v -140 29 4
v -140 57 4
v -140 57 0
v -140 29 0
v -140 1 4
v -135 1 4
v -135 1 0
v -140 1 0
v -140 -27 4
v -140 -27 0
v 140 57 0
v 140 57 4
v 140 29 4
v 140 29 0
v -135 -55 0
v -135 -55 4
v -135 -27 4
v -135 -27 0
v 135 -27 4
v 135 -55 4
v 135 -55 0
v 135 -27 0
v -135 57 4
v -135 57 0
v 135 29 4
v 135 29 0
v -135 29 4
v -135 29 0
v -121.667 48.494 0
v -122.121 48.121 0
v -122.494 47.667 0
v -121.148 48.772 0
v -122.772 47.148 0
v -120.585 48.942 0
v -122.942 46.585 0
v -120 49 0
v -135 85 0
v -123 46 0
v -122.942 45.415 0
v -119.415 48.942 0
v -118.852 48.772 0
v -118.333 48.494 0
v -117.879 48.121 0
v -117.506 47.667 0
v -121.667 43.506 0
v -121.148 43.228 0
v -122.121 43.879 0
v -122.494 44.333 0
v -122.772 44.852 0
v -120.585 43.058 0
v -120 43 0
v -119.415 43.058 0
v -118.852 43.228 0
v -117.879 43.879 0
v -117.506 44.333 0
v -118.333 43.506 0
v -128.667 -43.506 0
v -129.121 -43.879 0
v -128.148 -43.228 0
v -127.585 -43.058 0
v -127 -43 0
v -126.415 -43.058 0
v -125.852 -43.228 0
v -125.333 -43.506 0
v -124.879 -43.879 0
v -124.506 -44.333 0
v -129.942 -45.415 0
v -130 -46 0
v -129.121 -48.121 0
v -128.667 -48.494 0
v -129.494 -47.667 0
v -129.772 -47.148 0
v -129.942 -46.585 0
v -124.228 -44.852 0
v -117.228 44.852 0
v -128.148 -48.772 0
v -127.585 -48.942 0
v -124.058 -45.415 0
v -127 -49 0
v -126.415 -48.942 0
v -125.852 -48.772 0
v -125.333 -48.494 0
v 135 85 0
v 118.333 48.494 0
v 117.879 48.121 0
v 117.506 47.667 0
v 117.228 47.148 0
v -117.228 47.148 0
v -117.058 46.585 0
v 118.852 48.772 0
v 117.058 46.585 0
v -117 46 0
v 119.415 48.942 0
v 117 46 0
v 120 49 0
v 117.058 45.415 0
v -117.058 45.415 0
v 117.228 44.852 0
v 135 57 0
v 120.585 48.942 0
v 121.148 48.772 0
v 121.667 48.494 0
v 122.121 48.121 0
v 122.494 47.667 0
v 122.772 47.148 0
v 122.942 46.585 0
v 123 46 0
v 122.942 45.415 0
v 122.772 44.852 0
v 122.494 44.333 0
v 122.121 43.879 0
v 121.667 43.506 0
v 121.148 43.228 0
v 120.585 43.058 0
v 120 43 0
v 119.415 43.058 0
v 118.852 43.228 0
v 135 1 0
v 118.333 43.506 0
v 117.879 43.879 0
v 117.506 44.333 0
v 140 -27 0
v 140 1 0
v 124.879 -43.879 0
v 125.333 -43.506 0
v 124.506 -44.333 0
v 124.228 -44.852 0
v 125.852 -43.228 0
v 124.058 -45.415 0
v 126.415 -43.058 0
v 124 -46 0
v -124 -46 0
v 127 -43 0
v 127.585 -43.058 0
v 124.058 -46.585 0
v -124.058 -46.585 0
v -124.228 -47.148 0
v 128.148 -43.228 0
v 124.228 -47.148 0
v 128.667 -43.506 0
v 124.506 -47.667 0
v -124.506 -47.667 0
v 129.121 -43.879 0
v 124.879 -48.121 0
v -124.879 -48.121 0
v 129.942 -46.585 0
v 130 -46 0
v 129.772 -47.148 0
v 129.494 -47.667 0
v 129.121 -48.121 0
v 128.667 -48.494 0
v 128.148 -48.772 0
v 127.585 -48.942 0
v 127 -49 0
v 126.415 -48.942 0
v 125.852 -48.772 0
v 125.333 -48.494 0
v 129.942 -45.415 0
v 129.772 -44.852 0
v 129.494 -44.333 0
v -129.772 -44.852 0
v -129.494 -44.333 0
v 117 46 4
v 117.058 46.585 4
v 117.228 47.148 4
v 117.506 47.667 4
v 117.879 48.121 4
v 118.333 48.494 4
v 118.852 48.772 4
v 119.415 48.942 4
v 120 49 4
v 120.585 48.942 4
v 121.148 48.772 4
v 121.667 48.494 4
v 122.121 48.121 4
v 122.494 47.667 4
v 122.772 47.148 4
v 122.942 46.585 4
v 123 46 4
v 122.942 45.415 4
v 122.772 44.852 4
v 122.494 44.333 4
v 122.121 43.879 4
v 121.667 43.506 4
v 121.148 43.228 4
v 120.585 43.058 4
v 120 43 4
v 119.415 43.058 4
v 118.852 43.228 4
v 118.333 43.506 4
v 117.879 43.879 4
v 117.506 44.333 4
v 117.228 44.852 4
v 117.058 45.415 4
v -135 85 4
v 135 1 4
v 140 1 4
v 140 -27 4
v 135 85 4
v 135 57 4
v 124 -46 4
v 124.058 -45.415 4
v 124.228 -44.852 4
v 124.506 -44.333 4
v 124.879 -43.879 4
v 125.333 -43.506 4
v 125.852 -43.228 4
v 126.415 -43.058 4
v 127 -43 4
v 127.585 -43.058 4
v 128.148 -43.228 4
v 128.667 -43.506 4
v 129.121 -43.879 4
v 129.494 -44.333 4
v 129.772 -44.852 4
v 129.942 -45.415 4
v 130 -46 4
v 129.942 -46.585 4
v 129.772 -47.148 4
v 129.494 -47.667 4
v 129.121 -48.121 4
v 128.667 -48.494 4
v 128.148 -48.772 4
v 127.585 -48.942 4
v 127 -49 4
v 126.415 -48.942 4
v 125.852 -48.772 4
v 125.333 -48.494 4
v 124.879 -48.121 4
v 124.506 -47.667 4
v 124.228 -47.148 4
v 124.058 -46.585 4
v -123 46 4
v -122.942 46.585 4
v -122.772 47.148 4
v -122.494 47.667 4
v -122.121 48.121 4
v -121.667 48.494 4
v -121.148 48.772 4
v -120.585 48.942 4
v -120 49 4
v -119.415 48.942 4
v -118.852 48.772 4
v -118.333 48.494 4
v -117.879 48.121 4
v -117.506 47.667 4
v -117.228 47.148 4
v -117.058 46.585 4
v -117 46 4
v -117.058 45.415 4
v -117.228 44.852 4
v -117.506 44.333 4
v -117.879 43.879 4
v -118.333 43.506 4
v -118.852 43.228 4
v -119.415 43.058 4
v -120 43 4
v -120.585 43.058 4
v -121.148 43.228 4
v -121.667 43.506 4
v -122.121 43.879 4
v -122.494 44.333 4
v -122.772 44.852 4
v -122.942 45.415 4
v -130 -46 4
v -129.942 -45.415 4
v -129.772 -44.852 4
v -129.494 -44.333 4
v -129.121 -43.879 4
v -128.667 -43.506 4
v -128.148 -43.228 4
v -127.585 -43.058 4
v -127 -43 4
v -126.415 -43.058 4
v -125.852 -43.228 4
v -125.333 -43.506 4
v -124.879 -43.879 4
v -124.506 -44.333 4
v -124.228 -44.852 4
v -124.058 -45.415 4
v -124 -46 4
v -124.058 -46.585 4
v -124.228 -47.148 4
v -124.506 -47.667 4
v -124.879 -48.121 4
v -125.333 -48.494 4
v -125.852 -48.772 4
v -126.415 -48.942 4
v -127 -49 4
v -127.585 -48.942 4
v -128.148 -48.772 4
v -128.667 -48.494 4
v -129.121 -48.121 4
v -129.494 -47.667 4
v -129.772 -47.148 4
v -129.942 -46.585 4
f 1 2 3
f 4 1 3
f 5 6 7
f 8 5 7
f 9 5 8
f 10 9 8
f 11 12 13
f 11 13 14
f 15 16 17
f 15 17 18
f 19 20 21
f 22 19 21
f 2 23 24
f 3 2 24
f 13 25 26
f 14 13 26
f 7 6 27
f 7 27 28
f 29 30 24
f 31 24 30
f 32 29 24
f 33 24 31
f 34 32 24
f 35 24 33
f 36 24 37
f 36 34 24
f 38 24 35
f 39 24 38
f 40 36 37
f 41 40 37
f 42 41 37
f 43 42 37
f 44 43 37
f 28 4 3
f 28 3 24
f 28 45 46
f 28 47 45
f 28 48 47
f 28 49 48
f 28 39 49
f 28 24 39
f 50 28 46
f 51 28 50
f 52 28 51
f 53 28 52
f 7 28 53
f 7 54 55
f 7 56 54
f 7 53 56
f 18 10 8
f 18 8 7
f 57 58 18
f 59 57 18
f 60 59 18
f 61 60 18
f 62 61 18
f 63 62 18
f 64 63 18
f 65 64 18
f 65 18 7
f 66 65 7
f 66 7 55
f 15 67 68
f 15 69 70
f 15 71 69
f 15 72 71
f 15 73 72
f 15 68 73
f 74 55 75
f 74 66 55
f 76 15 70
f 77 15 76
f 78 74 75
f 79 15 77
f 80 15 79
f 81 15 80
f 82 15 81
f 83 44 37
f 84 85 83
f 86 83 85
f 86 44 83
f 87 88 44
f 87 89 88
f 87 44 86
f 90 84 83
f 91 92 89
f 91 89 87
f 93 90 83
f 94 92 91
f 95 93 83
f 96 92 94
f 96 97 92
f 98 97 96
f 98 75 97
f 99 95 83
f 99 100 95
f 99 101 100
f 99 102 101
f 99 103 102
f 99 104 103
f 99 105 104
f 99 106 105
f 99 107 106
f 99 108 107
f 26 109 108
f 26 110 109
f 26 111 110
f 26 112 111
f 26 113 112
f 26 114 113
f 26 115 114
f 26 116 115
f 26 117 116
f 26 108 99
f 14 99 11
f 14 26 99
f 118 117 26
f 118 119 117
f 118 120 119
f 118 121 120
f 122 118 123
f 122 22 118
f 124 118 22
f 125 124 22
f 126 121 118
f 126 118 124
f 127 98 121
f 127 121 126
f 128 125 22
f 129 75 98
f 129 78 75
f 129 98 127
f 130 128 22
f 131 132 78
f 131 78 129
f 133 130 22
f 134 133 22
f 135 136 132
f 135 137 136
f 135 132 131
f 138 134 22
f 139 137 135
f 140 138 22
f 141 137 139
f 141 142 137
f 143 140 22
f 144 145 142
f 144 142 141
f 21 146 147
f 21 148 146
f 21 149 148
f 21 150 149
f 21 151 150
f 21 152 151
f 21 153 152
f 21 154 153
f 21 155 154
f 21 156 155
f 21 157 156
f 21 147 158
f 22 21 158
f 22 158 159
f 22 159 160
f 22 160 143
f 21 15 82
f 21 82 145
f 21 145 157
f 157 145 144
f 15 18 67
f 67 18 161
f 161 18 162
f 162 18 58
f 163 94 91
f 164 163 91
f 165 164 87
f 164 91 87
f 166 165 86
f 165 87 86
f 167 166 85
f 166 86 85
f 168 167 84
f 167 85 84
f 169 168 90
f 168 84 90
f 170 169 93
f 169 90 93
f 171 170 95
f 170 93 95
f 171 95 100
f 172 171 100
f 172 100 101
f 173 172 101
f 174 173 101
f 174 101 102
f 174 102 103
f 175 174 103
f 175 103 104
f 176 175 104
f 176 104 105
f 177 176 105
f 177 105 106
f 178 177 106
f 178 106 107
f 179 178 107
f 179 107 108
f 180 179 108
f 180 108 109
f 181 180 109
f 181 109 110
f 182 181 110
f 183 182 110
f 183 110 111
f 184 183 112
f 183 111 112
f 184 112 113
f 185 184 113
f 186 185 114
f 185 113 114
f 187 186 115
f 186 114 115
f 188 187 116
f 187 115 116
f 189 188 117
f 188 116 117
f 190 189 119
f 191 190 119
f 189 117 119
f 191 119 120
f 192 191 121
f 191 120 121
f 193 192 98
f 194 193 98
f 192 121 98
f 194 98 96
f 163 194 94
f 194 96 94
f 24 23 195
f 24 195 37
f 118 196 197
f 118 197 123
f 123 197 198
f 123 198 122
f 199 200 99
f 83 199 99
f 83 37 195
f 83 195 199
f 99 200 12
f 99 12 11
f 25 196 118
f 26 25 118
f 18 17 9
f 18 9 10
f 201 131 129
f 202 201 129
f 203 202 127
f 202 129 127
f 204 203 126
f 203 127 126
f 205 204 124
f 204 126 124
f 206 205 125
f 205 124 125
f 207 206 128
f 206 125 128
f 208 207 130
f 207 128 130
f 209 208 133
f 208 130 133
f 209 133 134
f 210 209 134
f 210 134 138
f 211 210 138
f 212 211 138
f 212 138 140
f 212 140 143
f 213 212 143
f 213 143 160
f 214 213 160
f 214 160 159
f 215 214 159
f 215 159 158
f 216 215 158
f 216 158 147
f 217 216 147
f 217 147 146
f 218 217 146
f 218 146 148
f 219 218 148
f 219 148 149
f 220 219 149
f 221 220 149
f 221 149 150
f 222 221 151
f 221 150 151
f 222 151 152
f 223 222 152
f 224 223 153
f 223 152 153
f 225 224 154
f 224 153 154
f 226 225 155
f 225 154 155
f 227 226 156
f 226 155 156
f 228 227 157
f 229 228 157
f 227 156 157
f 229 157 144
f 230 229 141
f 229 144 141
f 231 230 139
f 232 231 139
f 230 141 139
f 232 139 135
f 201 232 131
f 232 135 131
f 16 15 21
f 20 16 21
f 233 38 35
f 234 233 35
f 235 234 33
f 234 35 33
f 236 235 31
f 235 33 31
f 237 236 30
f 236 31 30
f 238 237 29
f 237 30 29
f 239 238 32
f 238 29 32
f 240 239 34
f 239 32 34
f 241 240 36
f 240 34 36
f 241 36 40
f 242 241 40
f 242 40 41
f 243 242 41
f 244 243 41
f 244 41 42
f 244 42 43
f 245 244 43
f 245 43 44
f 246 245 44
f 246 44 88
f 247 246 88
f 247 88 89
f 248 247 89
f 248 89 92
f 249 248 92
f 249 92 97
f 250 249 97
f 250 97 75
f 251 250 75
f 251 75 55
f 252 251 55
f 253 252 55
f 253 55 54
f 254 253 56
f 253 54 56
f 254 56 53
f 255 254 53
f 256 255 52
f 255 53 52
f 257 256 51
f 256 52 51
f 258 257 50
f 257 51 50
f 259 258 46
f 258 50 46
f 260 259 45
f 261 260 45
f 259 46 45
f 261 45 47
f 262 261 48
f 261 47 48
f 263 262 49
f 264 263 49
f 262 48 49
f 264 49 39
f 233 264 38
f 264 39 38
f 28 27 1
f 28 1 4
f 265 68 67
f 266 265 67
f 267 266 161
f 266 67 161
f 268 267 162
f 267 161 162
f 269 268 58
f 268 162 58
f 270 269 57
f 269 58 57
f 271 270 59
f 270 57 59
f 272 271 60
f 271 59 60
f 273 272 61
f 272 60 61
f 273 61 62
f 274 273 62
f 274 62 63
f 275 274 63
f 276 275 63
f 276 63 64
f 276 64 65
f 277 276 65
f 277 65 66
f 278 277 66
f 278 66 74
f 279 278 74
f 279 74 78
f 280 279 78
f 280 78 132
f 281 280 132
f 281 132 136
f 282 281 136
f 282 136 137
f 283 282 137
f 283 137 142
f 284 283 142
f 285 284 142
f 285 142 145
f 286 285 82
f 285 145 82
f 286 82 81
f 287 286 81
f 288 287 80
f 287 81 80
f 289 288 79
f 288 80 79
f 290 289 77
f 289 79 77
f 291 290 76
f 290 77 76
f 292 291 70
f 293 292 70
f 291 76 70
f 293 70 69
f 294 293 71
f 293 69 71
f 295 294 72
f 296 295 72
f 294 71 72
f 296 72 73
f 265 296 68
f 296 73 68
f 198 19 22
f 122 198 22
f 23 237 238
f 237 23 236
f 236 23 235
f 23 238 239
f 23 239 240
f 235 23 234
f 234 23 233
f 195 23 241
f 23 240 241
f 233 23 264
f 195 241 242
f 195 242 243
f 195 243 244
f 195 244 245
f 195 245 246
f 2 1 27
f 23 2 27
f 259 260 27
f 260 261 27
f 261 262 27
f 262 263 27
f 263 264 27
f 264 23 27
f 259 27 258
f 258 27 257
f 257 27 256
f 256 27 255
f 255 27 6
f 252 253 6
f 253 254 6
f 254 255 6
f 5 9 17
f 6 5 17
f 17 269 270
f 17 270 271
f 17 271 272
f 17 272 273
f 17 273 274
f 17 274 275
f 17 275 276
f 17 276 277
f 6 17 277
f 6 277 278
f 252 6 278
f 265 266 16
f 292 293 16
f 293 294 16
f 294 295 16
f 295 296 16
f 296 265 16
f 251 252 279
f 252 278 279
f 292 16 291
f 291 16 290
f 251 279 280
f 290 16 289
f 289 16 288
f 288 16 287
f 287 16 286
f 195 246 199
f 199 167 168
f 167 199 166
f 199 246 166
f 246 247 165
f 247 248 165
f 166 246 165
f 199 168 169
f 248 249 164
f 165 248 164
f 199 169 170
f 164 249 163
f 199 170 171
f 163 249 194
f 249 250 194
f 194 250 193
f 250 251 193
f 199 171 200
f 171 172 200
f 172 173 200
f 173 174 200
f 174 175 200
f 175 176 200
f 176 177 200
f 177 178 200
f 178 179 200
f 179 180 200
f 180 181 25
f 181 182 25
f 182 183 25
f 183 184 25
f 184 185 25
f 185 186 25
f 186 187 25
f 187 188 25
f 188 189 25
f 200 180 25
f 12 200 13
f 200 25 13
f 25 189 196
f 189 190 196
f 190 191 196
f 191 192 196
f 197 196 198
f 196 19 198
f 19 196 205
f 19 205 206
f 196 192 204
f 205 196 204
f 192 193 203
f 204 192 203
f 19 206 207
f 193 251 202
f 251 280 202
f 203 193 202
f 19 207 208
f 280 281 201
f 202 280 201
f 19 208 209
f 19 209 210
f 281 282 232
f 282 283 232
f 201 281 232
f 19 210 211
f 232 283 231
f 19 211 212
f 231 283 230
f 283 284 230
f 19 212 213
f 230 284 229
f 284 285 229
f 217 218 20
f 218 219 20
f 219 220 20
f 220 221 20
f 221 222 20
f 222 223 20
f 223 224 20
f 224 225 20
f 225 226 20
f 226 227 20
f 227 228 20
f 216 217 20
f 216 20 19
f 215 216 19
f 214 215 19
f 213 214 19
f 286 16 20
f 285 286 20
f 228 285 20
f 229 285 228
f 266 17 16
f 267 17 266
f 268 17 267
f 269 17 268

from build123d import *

# Parameters (mm, degrees)
SKETCH1_W           = 270
SKETCH1_H           = 110
BOSS_EXTRUDE1_DEPTH = 4
SKETCH9_R           = 3
CUT_EXTRUDE1_DEPTH  = 146.828666592
SKETCH10_W          = 270
SKETCH10_H          = 4
BOSS_EXTRUDE2_DEPTH = 30
ESQUISSE1_W         = 4
ESQUISSE1_H         = 28
BOSS_EXTRU_1_DEPTH  = 5


with BuildPart() as part:
    # Sketch1 → Boss-Extrude1 (new body)
    with BuildSketch(Plane.XY):
        Rectangle(SKETCH1_W, SKETCH1_H)
    extrude(amount=BOSS_EXTRUDE1_DEPTH)

    # Sketch9 → Cut-Extrude1 (cut, through all)
    with BuildSketch(Plane(origin=(0, 0, 0), x_dir=(-1, 0, 0), z_dir=(0, 0, -1))):
        with Locations((-120, 46)):
            Circle(SKETCH9_R)
        with Locations((-127, -46)):
            Circle(SKETCH9_R)
        with Locations((120, 46)):
            Circle(SKETCH9_R)
        with Locations((127, -46)):
            Circle(SKETCH9_R)
    extrude(amount=-CUT_EXTRUDE1_DEPTH, mode=Mode.SUBTRACT)

    # Sketch10 → Boss-Extrude2 (add)
    with BuildSketch(Plane(origin=(0, 55, 0), x_dir=(1, 0, 0), z_dir=(0, 1, 0))):
        with Locations((0, -2)):
            Rectangle(SKETCH10_W, SKETCH10_H)
    extrude(amount=BOSS_EXTRUDE2_DEPTH)

    # Esquisse1 → Boss.-Extru.1 (add)
    with BuildSketch(Plane(origin=(135, 0, 0), x_dir=(0, 0, -1), z_dir=(1, 0, 0))):
        with Locations((-2, -13)):
            Rectangle(ESQUISSE1_W, ESQUISSE1_H)
        with Locations((-2, 43)):
            Rectangle(ESQUISSE1_W, ESQUISSE1_H)
    boss_extru_1 = extrude(amount=BOSS_EXTRU_1_DEPTH)

    # Symétrie1: Boss.-Extru.1 across plane
    add(boss_extru_1.mirror(Plane(origin=(0, 0, 0), x_dir=(0, 0, 1), z_dir=(1, 0, 0))))


solid = part.part
